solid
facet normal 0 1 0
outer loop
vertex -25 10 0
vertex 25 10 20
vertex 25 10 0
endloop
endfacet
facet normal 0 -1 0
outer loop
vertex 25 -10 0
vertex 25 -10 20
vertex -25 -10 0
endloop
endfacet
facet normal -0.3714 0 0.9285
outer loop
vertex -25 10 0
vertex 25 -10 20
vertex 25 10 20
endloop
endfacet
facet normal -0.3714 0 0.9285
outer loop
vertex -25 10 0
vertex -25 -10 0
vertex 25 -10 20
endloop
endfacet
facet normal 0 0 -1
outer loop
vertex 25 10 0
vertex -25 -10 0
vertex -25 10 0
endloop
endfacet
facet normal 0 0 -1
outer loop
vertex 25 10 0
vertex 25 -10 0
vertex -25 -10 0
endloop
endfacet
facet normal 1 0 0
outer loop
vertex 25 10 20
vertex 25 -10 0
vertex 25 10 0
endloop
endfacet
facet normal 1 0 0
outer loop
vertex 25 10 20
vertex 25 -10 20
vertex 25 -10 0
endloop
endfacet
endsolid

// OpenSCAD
// -*- mode: SCAD ; c-file-style: "ellemtel" ; coding: utf-8 -*-
//
// Simple wedge generator
//
// Written by Roland Sieker <ospalh@gmail.com>, 2017
// Licence: CC-0
// Have fun.

//
length = 50; // [1:0.1:200]
width = 20; // [1:0.1:200]
height = 20; // [1:0.1:200]
// The height of the sharp end. Typically 0
height_2 = 0; // [0:0.1:190]



module wedge()
{
   translate([0,width/2,0])
   rotate([90,0,0])
   {
      linear_extrude(width)
      {
         polygon([[-length/2,0], [length/2,0], [length/2,height], [-length/2,height_2]]);

      }
   }
}

wedge();
